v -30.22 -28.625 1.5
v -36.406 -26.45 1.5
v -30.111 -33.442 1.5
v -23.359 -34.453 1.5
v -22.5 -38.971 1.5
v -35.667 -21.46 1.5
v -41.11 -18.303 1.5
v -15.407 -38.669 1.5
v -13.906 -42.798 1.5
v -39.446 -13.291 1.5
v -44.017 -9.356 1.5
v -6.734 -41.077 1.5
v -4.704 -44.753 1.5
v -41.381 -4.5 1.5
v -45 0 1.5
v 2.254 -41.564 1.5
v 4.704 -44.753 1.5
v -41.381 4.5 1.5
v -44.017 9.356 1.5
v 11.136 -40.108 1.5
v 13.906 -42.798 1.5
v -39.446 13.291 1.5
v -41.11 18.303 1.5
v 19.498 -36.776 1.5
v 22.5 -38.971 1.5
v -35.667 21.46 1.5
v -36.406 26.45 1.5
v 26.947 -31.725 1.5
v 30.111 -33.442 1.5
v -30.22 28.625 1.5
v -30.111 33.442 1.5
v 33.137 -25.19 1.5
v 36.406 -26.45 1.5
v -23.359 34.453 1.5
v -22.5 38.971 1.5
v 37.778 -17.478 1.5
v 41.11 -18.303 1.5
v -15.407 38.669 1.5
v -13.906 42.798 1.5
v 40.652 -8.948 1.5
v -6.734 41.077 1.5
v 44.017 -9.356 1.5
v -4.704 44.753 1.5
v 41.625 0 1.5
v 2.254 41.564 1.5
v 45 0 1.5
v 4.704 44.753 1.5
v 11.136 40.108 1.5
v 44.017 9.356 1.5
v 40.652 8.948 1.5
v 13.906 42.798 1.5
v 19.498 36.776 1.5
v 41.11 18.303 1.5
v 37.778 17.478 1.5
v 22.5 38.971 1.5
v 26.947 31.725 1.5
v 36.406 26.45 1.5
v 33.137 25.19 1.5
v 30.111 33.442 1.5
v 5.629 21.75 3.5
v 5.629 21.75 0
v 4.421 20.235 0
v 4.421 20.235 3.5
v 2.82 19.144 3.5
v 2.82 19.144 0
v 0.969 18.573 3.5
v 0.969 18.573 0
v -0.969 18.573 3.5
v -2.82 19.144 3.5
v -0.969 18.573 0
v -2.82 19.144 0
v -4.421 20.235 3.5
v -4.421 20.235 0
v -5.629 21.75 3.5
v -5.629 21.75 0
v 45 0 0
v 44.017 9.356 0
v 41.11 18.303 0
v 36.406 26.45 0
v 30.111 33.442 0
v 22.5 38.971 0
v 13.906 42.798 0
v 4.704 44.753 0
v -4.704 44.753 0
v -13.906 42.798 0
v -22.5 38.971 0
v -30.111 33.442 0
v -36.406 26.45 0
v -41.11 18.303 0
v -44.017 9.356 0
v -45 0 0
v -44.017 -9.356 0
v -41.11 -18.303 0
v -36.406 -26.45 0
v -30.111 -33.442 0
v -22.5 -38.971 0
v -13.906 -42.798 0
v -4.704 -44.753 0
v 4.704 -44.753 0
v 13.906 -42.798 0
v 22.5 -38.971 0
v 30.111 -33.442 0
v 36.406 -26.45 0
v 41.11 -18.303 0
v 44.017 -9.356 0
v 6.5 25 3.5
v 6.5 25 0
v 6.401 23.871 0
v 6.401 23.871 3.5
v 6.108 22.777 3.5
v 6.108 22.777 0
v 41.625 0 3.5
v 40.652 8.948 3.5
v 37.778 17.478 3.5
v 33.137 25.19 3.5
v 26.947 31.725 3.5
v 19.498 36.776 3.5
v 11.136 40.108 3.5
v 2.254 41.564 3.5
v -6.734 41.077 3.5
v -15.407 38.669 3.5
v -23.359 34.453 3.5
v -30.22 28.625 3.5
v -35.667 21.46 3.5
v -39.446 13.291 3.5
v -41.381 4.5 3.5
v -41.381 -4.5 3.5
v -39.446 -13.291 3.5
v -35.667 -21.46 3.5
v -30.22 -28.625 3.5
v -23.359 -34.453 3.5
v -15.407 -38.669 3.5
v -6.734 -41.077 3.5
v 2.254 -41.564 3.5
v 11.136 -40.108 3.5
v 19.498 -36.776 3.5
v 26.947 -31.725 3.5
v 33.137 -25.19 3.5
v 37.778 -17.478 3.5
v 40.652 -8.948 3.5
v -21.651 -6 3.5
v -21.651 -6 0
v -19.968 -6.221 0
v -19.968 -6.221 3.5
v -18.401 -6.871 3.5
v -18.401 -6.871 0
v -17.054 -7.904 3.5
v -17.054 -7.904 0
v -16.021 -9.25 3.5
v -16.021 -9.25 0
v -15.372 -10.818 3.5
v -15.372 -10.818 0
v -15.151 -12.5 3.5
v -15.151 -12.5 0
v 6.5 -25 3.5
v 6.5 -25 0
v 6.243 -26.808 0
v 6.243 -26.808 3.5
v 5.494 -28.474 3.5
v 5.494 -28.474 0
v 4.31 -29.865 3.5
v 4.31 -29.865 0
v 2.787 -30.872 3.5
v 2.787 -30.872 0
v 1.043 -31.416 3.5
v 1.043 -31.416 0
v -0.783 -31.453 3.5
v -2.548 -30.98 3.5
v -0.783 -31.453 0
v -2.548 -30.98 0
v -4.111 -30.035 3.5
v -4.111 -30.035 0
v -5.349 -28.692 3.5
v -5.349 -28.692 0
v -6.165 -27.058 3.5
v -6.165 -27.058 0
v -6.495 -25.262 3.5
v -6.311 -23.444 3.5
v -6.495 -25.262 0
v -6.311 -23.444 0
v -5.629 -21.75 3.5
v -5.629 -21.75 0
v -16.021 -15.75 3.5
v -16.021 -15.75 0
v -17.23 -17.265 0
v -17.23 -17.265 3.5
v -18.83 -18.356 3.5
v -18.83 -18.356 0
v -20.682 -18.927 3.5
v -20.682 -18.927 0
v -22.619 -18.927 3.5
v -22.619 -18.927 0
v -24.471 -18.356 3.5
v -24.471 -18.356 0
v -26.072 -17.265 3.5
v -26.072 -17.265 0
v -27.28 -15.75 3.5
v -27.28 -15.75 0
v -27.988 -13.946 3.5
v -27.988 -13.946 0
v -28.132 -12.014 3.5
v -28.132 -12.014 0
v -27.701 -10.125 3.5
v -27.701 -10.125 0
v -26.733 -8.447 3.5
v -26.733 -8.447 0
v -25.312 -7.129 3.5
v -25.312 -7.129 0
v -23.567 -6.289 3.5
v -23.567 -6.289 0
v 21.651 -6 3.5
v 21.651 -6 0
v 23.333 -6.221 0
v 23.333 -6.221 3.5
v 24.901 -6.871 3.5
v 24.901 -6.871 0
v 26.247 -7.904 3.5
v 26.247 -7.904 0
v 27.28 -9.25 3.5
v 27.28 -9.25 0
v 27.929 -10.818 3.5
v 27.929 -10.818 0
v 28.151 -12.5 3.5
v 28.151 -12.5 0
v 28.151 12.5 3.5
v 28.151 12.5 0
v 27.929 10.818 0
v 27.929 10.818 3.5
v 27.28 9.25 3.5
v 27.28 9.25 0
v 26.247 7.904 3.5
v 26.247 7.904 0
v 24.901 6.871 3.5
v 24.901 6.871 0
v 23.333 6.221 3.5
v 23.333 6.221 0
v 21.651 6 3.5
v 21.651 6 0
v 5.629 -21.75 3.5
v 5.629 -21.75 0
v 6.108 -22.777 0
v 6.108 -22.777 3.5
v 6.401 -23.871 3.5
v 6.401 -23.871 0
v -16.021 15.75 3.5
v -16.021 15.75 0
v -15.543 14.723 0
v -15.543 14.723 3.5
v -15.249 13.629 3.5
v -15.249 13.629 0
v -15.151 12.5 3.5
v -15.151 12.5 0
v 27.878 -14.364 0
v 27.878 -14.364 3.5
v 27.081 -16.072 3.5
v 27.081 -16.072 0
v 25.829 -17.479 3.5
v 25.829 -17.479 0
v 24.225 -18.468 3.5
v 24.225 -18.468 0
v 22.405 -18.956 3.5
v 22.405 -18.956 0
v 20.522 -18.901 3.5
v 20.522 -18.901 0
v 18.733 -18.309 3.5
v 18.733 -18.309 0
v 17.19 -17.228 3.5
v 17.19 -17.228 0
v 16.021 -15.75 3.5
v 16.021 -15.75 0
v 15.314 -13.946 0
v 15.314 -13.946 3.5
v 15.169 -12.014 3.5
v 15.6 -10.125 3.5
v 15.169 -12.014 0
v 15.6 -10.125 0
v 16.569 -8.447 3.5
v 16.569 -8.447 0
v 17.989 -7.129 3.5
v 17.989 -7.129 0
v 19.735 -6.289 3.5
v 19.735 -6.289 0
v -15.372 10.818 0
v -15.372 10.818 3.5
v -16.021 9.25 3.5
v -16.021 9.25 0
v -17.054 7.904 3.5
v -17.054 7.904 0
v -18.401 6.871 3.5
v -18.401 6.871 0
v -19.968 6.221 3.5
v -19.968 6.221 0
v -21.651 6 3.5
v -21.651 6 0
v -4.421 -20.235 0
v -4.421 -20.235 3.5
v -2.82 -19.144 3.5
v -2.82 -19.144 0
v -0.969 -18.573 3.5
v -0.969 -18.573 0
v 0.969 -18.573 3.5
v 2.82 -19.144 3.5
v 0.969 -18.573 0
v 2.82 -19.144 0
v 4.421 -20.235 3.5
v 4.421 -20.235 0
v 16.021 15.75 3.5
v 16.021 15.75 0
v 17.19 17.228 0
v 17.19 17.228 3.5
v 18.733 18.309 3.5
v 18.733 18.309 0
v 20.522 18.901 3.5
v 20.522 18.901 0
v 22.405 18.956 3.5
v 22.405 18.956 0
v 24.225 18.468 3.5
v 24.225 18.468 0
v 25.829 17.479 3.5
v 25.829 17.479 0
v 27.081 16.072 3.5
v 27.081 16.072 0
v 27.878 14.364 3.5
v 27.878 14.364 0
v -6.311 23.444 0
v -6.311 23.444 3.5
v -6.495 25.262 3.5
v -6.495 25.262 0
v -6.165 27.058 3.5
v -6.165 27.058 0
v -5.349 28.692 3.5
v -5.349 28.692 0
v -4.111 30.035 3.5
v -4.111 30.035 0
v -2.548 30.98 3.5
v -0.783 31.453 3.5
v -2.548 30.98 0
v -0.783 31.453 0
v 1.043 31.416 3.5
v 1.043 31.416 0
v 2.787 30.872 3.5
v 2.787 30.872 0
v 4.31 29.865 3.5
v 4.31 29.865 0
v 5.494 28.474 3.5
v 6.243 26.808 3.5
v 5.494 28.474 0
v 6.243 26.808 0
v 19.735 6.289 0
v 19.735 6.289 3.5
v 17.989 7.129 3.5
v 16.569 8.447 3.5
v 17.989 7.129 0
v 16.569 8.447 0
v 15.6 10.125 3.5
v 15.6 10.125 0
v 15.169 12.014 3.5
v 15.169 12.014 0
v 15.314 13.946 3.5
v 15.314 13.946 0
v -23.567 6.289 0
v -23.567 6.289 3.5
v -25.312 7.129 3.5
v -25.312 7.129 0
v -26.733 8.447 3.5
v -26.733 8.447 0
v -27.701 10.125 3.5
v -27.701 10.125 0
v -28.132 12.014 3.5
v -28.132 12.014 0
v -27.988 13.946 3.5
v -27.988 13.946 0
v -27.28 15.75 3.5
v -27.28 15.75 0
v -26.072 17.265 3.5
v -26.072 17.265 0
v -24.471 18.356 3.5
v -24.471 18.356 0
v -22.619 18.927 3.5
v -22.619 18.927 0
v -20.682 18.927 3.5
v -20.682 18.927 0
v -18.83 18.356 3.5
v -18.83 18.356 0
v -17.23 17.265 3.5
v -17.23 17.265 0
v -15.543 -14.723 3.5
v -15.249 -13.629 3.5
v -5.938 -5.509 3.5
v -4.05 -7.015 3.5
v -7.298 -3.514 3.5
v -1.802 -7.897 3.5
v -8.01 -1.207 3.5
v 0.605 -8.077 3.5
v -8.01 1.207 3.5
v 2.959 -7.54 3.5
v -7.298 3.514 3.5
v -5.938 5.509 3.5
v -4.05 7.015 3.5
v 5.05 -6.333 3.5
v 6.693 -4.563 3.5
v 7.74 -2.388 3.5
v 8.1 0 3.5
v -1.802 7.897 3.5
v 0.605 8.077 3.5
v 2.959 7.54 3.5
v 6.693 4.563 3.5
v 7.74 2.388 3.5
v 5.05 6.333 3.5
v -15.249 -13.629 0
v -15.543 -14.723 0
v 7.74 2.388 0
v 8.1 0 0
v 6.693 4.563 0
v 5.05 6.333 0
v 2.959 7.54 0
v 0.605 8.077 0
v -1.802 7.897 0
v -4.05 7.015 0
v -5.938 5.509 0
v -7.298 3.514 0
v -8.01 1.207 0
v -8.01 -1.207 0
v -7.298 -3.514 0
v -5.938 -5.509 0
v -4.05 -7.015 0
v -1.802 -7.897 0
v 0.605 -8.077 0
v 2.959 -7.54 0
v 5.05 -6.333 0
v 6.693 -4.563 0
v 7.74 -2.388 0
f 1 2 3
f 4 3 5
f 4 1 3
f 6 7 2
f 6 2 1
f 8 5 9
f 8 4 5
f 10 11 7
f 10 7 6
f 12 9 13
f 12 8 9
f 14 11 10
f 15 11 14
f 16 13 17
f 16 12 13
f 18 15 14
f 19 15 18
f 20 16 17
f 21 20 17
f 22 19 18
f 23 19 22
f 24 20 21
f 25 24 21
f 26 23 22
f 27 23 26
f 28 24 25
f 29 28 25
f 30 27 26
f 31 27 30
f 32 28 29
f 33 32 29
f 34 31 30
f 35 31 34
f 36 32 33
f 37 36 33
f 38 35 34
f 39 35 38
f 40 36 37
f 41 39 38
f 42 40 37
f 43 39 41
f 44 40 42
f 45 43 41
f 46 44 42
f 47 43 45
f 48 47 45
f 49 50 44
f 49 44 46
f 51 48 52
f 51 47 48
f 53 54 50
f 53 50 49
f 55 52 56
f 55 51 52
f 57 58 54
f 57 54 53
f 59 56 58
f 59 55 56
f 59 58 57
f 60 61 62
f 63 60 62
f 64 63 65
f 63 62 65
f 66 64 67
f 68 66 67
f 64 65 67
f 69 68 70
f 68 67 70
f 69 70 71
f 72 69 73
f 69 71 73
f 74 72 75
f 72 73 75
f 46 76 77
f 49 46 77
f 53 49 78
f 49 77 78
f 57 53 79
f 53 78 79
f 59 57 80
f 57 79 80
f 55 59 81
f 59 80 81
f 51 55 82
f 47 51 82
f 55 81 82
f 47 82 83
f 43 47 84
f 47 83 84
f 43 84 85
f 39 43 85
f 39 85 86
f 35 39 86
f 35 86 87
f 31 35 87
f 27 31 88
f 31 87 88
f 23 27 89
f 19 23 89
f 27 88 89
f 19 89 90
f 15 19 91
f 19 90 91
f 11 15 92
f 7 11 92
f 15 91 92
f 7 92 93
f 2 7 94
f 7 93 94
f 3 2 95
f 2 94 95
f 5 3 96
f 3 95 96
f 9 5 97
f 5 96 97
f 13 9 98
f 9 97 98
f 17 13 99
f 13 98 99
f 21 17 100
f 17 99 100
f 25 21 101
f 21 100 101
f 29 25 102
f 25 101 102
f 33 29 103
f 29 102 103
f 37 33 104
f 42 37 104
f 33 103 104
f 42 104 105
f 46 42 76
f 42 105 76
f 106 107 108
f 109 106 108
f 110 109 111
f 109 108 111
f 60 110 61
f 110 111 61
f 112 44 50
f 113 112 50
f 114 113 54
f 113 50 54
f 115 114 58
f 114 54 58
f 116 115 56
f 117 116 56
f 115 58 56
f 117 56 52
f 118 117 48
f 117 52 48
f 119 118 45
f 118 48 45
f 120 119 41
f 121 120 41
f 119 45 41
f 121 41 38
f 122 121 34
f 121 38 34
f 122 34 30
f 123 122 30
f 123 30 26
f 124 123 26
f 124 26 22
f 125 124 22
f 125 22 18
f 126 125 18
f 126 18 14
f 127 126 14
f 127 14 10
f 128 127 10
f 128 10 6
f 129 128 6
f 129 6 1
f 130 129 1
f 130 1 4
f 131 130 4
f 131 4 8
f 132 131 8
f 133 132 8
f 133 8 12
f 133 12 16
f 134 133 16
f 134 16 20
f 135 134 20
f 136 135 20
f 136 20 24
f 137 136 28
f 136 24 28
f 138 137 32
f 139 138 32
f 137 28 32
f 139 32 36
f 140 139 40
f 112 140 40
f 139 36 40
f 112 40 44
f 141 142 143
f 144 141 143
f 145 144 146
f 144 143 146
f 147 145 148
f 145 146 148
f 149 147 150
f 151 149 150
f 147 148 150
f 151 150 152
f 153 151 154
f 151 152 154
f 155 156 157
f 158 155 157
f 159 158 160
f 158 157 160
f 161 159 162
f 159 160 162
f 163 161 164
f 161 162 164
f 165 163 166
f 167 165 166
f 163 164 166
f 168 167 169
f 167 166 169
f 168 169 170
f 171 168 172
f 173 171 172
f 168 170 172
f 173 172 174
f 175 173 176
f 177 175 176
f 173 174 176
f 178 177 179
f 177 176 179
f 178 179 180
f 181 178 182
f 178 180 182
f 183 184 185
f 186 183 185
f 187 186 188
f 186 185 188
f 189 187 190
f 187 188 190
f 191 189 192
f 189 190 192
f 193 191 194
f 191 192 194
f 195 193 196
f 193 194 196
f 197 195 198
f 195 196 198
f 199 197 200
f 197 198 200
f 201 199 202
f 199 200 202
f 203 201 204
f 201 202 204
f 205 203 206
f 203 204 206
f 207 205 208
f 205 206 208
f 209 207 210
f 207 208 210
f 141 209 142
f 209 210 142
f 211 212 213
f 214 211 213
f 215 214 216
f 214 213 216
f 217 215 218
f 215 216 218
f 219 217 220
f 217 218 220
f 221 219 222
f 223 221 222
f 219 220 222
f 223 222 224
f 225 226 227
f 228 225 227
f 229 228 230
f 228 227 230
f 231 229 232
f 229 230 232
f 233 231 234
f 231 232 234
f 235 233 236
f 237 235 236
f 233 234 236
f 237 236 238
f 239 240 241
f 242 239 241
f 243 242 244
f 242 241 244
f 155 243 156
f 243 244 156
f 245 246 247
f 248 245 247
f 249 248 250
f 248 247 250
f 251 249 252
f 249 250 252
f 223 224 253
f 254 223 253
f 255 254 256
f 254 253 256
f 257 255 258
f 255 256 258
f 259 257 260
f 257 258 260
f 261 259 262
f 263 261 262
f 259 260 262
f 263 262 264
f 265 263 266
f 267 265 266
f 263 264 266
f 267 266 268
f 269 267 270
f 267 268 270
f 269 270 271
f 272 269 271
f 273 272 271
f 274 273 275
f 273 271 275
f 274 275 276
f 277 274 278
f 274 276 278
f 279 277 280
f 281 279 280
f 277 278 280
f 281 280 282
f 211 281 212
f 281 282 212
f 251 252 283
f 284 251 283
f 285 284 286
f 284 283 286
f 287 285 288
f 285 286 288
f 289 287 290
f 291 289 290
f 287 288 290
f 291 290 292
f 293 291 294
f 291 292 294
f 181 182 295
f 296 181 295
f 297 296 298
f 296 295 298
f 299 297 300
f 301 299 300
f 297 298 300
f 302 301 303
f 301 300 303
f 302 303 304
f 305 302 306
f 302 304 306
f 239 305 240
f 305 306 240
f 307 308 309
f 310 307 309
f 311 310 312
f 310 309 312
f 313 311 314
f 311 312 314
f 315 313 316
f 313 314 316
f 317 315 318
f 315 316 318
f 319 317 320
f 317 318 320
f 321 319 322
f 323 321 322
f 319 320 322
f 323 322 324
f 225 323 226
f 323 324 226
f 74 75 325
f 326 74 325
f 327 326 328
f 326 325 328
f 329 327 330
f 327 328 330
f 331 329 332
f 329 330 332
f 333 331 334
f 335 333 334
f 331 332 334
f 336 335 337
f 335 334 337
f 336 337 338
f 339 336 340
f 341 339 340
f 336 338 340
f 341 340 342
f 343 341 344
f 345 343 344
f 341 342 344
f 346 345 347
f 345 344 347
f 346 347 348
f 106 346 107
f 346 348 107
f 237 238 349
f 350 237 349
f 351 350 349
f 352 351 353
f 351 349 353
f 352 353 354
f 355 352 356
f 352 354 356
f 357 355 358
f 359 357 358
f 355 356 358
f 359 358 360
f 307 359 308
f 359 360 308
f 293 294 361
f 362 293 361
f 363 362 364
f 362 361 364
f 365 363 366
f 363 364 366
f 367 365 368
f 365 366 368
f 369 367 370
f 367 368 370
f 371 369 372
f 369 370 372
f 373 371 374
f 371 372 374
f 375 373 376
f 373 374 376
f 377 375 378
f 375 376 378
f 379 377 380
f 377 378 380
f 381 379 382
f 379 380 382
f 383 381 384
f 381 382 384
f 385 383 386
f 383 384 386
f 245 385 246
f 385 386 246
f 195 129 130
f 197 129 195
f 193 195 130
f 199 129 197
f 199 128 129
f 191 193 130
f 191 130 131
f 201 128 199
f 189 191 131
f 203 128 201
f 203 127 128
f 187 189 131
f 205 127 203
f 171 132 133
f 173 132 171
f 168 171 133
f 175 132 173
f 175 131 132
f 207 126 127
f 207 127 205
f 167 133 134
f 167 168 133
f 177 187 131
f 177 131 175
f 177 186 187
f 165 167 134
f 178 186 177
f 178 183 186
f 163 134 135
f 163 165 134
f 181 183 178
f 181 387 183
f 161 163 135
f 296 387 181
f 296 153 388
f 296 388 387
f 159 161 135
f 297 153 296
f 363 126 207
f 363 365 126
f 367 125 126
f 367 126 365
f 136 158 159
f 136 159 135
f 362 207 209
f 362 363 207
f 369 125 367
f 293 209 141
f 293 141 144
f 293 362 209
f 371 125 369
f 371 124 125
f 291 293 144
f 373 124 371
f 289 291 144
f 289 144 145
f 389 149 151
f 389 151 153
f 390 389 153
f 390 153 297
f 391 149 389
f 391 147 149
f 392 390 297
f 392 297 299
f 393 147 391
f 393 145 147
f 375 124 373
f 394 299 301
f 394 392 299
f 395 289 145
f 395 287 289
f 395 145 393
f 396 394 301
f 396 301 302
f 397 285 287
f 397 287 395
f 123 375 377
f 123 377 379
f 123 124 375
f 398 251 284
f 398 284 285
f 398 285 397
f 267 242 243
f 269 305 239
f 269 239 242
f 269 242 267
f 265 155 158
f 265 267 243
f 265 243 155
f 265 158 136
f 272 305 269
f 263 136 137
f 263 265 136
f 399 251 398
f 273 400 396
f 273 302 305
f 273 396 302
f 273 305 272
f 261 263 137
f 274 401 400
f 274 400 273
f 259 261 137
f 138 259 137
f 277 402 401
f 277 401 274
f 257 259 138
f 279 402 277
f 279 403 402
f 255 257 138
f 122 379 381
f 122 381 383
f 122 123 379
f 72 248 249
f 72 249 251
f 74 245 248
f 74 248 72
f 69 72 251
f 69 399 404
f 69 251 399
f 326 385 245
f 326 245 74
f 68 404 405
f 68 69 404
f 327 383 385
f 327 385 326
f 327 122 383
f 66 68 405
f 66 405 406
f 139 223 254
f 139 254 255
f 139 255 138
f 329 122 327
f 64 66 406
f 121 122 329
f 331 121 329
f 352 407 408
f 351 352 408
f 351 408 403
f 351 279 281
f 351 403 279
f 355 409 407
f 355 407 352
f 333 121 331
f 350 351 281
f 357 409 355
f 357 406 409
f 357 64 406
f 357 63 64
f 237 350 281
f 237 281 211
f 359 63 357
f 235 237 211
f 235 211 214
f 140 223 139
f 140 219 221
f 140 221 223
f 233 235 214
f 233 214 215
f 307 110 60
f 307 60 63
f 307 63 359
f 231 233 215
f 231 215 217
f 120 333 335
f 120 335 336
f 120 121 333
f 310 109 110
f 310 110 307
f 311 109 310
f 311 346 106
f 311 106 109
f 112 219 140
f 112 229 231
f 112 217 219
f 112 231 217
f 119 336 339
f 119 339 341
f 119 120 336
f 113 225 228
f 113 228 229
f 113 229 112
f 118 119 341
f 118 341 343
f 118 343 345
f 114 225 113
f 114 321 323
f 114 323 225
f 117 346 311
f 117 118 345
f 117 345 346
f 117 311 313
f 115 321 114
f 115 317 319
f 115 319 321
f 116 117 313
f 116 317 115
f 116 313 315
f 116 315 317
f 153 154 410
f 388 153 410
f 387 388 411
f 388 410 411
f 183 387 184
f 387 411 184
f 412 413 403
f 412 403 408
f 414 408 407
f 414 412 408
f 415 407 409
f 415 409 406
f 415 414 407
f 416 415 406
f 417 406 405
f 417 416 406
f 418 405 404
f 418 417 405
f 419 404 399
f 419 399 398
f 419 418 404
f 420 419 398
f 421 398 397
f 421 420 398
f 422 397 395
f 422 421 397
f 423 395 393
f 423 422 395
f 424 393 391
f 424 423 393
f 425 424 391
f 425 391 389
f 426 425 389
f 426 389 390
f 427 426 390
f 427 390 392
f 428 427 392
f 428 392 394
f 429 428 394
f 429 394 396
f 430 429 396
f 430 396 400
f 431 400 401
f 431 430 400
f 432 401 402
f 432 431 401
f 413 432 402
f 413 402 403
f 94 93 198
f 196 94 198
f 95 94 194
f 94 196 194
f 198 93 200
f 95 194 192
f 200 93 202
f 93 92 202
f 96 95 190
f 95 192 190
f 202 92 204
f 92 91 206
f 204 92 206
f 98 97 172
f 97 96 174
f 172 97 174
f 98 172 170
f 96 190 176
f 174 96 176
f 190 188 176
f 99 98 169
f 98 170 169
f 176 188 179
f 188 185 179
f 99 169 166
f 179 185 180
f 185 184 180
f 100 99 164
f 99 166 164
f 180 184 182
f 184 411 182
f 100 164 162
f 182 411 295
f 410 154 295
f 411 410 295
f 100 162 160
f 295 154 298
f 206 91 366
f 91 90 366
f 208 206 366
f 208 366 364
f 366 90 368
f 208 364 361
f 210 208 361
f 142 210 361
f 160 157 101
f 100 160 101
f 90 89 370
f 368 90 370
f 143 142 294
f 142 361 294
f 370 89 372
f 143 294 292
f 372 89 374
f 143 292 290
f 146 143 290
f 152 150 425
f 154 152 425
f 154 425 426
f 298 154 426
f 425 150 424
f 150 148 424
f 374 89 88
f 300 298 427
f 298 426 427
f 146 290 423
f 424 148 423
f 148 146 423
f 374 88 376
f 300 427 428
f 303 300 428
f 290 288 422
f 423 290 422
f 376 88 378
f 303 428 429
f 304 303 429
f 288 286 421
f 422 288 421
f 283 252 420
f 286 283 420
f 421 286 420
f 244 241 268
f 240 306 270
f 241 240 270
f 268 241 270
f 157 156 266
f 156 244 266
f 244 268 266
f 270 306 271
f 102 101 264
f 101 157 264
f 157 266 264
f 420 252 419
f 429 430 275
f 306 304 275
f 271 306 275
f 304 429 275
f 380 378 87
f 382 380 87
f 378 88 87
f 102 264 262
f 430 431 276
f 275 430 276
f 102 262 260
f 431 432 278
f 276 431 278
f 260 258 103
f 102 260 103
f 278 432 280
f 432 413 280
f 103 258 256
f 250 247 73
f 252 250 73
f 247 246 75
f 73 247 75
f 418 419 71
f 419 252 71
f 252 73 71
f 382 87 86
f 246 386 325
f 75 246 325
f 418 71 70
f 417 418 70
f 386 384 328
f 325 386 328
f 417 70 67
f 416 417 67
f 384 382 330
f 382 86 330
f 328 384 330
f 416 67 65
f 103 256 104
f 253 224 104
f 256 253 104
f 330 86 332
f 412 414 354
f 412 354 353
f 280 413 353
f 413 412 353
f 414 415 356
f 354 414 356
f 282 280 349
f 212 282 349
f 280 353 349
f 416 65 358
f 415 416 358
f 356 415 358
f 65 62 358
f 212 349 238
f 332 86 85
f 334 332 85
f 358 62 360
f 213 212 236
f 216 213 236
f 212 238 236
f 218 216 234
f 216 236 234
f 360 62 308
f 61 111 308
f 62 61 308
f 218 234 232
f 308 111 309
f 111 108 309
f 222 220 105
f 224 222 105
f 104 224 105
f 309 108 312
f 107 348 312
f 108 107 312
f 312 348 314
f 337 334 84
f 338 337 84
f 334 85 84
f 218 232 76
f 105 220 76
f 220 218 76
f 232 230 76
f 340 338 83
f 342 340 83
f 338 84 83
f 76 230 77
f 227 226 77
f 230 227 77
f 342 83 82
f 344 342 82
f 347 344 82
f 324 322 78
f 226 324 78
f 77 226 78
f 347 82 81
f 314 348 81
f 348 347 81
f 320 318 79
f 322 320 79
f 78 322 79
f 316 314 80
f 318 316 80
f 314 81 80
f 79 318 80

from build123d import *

# Parameters (mm, degrees)
F0_R     = 41.625
F0_R_2   = 8.1
F1_DEPTH = 3.5
F0_R_3   = 45
F2_DEPTH = 1.5


with BuildPart() as f1:
    # F0 (on Top) → F1 (new body)
    with BuildSketch(Plane.XY):
        Circle(F0_R)
        with BuildLine():
            ThreePointArc((6.5, 25), (6.278518, 23.317676), (5.629165, 21.75))
            Line((5.629165, 21.75), (16.02147, 15.75))
            ThreePointArc((16.02147, 15.75), (23.332959, 18.778518), (28.150635, 12.5))
            ThreePointArc((28.150635, 12.5), (26.246829, 7.903806), (21.650635, 6))
            Line((21.650635, 6), (21.650635, -6))
            ThreePointArc((21.650635, -6), (26.246829, -7.903806), (28.150635, -12.5))
            ThreePointArc((28.150635, -12.5), (23.332959, -18.778518), (16.02147, -15.75))
            Line((16.02147, -15.75), (5.629165, -21.75))
            ThreePointArc((5.629165, -21.75), (6.278518, -23.317676), (6.5, -25))
            ThreePointArc((6.5, -25), (-1.682324, -31.278518), (-5.629165, -21.75))
            Line((-5.629165, -21.75), (-16.02147, -15.75))
            ThreePointArc((-16.02147, -15.75), (-27.2798, -15.75), (-21.650635, -6))
            Line((-21.650635, -6), (-21.650635, 6))
            ThreePointArc((-21.650635, 6), (-27.2798, 15.75), (-16.02147, 15.75))
            Line((-16.02147, 15.75), (-5.629165, 21.75))
            ThreePointArc((-5.629165, 21.75), (-1.682324, 31.278518), (6.5, 25))
        make_face(mode=Mode.SUBTRACT)
        with BuildLine():
            Line((16.02147, 15.75), (5.629165, 21.75))
            ThreePointArc((5.629165, 21.75), (0, 18.5), (-5.629165, 21.75))
            Line((-5.629165, 21.75), (-16.02147, 15.75))
            ThreePointArc((-16.02147, 15.75), (-15.372117, 14.182324), (-15.150635, 12.5))
            ThreePointArc((-15.150635, 12.5), (-17.054441, 7.903806), (-21.650635, 6))
            Line((-21.650635, 6), (-21.650635, -6))
            ThreePointArc((-21.650635, -6), (-17.054441, -7.903806), (-15.150635, -12.5))
            ThreePointArc((-15.150635, -12.5), (-15.372117, -14.182324), (-16.02147, -15.75))
            Line((-16.02147, -15.75), (-5.629165, -21.75))
            ThreePointArc((-5.629165, -21.75), (0, -18.5), (5.629165, -21.75))
            Line((5.629165, -21.75), (16.02147, -15.75))
            ThreePointArc((16.02147, -15.75), (16.02147, -9.25), (21.650635, -6))
            Line((21.650635, -6), (21.650635, 6))
            ThreePointArc((21.650635, 6), (16.02147, 9.25), (16.02147, 15.75))
        make_face()
        Circle(F0_R_2, mode=Mode.SUBTRACT)
    extrude(amount=F1_DEPTH)

    # F0 (on Top) → F2 (join)
    with BuildSketch(Plane.XY):
        Circle(F0_R_3)
        Circle(F0_R, mode=Mode.SUBTRACT)
    extrude(amount=F2_DEPTH)


solid = f1.part
